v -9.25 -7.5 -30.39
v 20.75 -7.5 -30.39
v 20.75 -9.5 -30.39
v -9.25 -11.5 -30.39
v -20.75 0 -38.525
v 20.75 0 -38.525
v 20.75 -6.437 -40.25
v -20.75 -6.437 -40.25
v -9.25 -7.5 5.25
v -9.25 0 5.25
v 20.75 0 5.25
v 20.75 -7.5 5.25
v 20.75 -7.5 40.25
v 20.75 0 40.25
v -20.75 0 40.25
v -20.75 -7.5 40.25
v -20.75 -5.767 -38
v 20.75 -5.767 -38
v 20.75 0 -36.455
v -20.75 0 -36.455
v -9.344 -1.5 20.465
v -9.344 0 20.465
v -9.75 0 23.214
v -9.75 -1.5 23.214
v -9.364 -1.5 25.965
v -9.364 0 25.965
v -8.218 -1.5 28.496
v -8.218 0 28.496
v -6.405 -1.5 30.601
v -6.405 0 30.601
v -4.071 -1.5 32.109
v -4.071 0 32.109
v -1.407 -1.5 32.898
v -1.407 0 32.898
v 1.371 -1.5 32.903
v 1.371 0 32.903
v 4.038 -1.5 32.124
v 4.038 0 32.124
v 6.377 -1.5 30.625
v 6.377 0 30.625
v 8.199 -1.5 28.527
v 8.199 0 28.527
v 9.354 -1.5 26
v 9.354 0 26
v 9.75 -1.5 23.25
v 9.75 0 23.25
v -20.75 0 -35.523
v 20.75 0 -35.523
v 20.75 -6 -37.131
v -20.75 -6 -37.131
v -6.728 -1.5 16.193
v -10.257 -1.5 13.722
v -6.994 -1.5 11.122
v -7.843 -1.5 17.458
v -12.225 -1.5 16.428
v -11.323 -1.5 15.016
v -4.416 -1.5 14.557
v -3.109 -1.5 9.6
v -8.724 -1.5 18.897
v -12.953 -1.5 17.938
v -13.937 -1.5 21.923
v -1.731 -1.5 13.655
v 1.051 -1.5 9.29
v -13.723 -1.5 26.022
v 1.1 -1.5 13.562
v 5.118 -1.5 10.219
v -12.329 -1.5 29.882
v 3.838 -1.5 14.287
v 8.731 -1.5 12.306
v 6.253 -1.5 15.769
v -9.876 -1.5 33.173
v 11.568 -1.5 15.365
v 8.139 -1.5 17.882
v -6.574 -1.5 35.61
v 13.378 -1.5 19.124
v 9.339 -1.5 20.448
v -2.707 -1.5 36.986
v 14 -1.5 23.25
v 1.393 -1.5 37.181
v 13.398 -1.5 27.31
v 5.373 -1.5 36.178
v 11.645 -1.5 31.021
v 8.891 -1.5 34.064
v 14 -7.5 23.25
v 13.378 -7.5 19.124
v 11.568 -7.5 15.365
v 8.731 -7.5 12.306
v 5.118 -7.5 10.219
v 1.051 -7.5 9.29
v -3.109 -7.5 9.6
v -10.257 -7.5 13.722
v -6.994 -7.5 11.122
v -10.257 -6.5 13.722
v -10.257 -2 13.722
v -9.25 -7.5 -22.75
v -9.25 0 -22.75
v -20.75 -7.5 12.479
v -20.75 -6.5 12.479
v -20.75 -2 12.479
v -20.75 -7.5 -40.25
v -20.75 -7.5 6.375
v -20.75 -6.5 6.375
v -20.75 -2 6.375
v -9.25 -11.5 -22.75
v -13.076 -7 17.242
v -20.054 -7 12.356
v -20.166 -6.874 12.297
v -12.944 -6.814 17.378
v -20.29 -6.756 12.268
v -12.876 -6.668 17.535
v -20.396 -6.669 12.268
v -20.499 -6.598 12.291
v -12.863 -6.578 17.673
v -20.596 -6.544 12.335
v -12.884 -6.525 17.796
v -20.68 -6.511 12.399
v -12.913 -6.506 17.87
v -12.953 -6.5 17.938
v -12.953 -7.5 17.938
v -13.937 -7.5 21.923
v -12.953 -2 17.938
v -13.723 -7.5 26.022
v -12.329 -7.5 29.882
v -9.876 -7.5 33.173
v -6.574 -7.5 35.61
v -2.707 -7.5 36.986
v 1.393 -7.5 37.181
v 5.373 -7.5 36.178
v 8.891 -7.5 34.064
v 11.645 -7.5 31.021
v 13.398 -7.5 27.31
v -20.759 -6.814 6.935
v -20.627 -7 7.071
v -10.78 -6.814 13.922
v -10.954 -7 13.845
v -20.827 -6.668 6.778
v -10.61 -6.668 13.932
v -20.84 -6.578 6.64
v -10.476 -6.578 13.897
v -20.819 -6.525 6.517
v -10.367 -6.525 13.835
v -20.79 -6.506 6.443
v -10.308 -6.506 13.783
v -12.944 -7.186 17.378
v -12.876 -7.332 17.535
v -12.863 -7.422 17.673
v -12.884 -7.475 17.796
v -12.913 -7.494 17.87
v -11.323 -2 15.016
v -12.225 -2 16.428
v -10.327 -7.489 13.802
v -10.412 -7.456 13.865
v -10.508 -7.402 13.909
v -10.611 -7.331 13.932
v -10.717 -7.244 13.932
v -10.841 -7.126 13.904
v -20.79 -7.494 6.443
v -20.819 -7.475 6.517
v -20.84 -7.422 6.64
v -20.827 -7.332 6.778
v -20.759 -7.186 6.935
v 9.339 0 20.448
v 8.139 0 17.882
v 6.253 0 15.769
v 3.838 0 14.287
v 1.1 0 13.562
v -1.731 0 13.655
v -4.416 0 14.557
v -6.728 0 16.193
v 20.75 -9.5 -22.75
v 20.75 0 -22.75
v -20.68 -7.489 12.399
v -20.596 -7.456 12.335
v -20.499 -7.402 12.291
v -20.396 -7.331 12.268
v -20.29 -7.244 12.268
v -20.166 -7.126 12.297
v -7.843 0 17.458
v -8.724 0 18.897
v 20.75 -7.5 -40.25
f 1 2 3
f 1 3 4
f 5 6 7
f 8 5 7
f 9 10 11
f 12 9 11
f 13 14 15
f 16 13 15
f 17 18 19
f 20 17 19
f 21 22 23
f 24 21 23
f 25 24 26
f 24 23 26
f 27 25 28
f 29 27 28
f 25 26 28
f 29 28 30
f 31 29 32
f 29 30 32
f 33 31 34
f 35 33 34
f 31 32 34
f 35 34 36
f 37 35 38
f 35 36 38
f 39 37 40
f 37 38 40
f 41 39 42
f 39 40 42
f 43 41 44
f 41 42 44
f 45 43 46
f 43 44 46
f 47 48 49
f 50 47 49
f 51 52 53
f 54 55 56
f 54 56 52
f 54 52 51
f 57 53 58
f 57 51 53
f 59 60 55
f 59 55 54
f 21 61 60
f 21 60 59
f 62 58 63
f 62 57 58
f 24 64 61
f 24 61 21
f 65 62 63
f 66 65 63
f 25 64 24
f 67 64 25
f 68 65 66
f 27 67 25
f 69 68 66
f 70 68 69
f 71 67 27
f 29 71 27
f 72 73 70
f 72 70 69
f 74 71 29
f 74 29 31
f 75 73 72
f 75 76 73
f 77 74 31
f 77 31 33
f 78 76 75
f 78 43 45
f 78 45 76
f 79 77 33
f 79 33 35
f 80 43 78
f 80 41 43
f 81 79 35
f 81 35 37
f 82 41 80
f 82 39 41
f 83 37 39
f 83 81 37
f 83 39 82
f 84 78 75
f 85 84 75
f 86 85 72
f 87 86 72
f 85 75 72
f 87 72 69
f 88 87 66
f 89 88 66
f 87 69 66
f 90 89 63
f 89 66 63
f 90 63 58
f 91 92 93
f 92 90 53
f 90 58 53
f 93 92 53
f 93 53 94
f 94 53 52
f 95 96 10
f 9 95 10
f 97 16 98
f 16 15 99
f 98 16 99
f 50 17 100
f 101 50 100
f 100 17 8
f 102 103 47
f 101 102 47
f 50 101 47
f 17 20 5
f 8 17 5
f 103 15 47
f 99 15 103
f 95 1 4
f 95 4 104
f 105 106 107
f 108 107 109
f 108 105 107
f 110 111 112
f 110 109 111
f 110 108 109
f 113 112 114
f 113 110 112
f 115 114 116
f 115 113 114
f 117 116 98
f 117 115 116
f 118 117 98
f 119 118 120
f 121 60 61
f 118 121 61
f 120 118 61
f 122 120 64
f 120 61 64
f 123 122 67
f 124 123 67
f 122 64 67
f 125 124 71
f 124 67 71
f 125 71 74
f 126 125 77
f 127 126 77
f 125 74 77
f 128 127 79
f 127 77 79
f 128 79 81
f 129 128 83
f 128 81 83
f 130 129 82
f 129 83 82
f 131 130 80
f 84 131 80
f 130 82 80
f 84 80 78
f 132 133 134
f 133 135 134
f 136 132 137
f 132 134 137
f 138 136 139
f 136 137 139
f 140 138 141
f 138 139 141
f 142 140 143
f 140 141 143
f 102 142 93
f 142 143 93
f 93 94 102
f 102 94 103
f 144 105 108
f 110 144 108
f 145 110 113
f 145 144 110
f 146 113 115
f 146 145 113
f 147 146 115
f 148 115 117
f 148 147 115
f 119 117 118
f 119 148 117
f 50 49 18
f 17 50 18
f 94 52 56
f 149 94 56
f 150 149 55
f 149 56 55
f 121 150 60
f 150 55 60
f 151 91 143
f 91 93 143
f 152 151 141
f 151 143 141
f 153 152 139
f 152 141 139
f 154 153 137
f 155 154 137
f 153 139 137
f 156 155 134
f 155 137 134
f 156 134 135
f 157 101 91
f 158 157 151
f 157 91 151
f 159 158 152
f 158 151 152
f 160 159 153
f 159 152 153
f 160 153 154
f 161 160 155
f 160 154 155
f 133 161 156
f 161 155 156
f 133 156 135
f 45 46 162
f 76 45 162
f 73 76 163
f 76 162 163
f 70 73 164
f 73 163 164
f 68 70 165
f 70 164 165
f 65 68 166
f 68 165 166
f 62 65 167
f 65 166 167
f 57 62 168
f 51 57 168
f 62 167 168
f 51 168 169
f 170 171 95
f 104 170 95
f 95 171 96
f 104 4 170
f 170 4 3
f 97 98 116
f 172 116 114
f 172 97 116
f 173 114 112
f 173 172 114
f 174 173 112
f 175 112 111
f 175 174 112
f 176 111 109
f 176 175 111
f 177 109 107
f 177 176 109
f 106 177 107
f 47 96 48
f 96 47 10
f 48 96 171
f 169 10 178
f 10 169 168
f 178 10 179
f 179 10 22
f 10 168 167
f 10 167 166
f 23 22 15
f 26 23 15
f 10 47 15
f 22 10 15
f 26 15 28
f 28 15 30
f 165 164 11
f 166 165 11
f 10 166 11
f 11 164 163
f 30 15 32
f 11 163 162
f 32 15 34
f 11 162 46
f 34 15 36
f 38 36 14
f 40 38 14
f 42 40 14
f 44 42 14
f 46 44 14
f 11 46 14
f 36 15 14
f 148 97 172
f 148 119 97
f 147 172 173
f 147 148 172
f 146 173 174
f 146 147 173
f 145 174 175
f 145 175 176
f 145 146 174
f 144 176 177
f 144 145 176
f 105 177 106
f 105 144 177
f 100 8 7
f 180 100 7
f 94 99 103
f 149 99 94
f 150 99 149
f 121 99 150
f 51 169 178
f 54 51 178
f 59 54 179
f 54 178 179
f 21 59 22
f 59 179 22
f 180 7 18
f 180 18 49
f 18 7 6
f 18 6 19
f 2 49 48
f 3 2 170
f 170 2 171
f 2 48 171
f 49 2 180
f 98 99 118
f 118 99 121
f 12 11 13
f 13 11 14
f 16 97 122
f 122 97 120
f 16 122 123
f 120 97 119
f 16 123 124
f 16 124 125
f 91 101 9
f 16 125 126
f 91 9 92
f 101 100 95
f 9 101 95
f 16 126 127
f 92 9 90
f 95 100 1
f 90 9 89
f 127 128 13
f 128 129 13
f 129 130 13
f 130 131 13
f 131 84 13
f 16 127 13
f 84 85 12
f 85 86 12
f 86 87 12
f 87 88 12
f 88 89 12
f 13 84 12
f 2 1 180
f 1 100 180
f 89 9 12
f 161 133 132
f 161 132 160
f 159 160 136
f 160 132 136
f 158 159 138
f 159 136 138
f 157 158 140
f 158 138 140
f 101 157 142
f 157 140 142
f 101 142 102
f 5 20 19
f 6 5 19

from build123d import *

# Parameters (mm, degrees)
F1_DEPTH  = 7.5
F2_DEPTH  = 1.5
F3_DEPTH  = 2
F5_DEPTH  = 45
F6_DEPTH  = 45
F7_W      = 9.5182569801
F7_H      = 1
F8_DEPTH  = 0.5
F9_W      = 12.8092049275
F9_H      = 1
F10_DEPTH = 0.5
F11_R     = 0.49999
F12_R     = 0.49999
F13_W     = 30
F13_H     = 7.6395883262
F14_DEPTH = 11.5
F16_DEPTH = 12.5


# Not quite as in the source:
# - a fillet or chamfer is up to 0.001 mm smaller than in the source, because OpenCascade refuses the exact size


with BuildPart() as f1:
    # F0 (on Front) → F1 (new body)
    with BuildSketch(Plane.XZ):
        with BuildLine():
            Line((-20.75, -40.25), (20.75, -40.25))
            Line((20.75, -40.25), (20.75, -22.75))
            Line((20.75, -22.75), (-9.25, -22.75))
            Line((-9.25, -22.75), (-9.25, 5.25))
            Line((-9.25, 5.25), (20.75, 5.25))
            Line((20.75, 5.25), (20.75, 40.25))
            Line((20.75, 40.25), (-20.75, 40.25))
            Line((-20.75, 40.25), (-20.75, 12.4785664195))
            Line((-20.75, 12.4785664195), (-12.9531003366, 17.9380143384))
            ThreePointArc((-12.9531003366, 17.9380143384), (-2.707082866, 36.9857818255), (14, 23.25))
            ThreePointArc((14, 23.25), (5.1184768061, 10.2192212364), (-10.2573135979, 13.7217515905))
            Line((-10.2573135979, 13.7217515905), (-20.75, 6.3746934757))
            Line((-20.75, 6.3746934757), (-20.75, -40.25))
        make_face()
    extrude(amount=F1_DEPTH)

    # F0 (on Front) → F2 (join)
    with BuildSketch(Plane.XZ):
        with BuildLine():
            ThreePointArc((-12.9531003366, 17.9380143384), (-11.7951280893, 15.7084515279), (-10.2573135979, 13.7217515905))
            Line((-10.2573135979, 13.7217515905), (-6.7277993643, 16.1931440631))
            ThreePointArc((-6.7277993643, 16.1931440631), (-8.3148780488, 18.158310395), (-9.3438531565, 20.4652364212))
            Line((-9.3438531565, 20.4652364212), (-12.9531003366, 17.9380143384))
        make_face()
        with BuildLine():
            Line((-6.7277993643, 16.1931440631), (-10.2573135979, 13.7217515905))
            ThreePointArc((-10.2573135979, 13.7217515905), (5.1184768061, 10.2192212364), (14, 23.25))
            ThreePointArc((14, 23.25), (-2.707082866, 36.9857818255), (-12.9531003366, 17.9380143384))
            Line((-12.9531003366, 17.9380143384), (-9.3438531565, 20.4652364212))
            ThreePointArc((-9.3438531565, 20.4652364212), (-1.4071125975, 32.8979290077), (9.75, 23.25))
            ThreePointArc((9.75, 23.25), (3.8383887374, 14.2873401325), (-6.7277993643, 16.1931440631))
        make_face()
    extrude(amount=F2_DEPTH)

    # F0 (on Front) → F3 (join)
    with BuildSketch(Plane.XZ):
        with BuildLine():
            Line((-20.75, 12.4785664195), (-20.75, 6.3746934757))
            Line((-20.75, 6.3746934757), (-10.2573135979, 13.7217515905))
            ThreePointArc((-10.2573135979, 13.7217515905), (-11.7951280893, 15.7084515279), (-12.9531003366, 17.9380143384))
            Line((-12.9531003366, 17.9380143384), (-20.75, 12.4785664195))
        make_face()
    extrude(amount=F3_DEPTH)

    # F4 (on face) → F5 (cut)
    with BuildSketch(Plane.YZ.offset(20.75)):
        Polygon((-6.4365309663, -40.25), (0, -40.25), (0, -38.5253367255), align=None)
    extrude(amount=-F5_DEPTH, mode=Mode.SUBTRACT)

    # F4 (on face) → F6 (cut)
    with BuildSketch(Plane.YZ.offset(20.75)):
        Polygon((-5.7670628594, -38.0000642006), (0, -36.4547843647), (0, -35.5230358023), (-6, -37.1307309569), align=None)
    extrude(amount=-F6_DEPTH, mode=Mode.SUBTRACT)

    # F7 (on face) → F8 (join)
    with BuildSketch(Plane(origin=(-12.6895494042, 0, 18.122554688), x_dir=(0.8191520443, 0, 0.5735764364), z_dir=(0.5735764364, 0, -0.8191520443))):
        with Locations((-5.0808647713, 7)):
            Rectangle(F7_W, F7_H)
    extrude(amount=F8_DEPTH)

    # F9 (on face) → F10 (join)
    with BuildSketch(Plane(origin=(-9.8216672224, 0, 14.0267944666), x_dir=(0.8191520443, 0, 0.5735764364), z_dir=(-0.5735764364, 0, 0.8191520443))):
        with Locations((-6.9364284886, -7)):
            Rectangle(F9_W, F9_H)
    extrude(amount=F10_DEPTH)

    # F11 (radius 0.5 in the source; OpenCascade refuses exactly that, so slightly less here)
    f11_edges = [f1.edges().sort_by_distance(p)[0] for p in [
        (-20.463212, -7, 12.06899),
        (-16.564762, -6.5, 14.798714),
        (-12.666312, -7, 17.528438),
        (-16.564762, -7.5, 14.798714),
    ]]
    fillet(f11_edges, radius=F11_R)

    # F12 (radius 0.5 in the source; OpenCascade refuses exactly that, so slightly less here)
    f12_edges = [f1.edges().sort_by_distance(p)[0] for p in [
        (-15.790445, -6.5, 10.457799),
        (-21.036788, -7, 6.784269),
        (-15.790445, -7.5, 10.457799),
        (-10.544102, -7, 14.131328),
    ]]
    fillet(f12_edges, radius=F12_R)

    # F13 (on face) → F14 (join)
    with BuildSketch(Plane(origin=(0, 0, 0), x_dir=(-1, 0, 0), z_dir=(0, 1, 0))):
        with Locations((-5.75, -26.5697941631)):
            Rectangle(F13_W, F13_H)
    extrude(amount=-F14_DEPTH)

    # F15 (on face) → F16 (cut, symmetric)
    with BuildSketch(Plane(origin=(0, 0, -30.3895883262), x_dir=(1, 0, 0), z_dir=(0, 0, -1))):
        Polygon((-9.25, 11.5), (20.75, 9.5), (20.75, 11.5), align=None)
    extrude(amount=F16_DEPTH, both=True, mode=Mode.SUBTRACT)


solid = f1.part
